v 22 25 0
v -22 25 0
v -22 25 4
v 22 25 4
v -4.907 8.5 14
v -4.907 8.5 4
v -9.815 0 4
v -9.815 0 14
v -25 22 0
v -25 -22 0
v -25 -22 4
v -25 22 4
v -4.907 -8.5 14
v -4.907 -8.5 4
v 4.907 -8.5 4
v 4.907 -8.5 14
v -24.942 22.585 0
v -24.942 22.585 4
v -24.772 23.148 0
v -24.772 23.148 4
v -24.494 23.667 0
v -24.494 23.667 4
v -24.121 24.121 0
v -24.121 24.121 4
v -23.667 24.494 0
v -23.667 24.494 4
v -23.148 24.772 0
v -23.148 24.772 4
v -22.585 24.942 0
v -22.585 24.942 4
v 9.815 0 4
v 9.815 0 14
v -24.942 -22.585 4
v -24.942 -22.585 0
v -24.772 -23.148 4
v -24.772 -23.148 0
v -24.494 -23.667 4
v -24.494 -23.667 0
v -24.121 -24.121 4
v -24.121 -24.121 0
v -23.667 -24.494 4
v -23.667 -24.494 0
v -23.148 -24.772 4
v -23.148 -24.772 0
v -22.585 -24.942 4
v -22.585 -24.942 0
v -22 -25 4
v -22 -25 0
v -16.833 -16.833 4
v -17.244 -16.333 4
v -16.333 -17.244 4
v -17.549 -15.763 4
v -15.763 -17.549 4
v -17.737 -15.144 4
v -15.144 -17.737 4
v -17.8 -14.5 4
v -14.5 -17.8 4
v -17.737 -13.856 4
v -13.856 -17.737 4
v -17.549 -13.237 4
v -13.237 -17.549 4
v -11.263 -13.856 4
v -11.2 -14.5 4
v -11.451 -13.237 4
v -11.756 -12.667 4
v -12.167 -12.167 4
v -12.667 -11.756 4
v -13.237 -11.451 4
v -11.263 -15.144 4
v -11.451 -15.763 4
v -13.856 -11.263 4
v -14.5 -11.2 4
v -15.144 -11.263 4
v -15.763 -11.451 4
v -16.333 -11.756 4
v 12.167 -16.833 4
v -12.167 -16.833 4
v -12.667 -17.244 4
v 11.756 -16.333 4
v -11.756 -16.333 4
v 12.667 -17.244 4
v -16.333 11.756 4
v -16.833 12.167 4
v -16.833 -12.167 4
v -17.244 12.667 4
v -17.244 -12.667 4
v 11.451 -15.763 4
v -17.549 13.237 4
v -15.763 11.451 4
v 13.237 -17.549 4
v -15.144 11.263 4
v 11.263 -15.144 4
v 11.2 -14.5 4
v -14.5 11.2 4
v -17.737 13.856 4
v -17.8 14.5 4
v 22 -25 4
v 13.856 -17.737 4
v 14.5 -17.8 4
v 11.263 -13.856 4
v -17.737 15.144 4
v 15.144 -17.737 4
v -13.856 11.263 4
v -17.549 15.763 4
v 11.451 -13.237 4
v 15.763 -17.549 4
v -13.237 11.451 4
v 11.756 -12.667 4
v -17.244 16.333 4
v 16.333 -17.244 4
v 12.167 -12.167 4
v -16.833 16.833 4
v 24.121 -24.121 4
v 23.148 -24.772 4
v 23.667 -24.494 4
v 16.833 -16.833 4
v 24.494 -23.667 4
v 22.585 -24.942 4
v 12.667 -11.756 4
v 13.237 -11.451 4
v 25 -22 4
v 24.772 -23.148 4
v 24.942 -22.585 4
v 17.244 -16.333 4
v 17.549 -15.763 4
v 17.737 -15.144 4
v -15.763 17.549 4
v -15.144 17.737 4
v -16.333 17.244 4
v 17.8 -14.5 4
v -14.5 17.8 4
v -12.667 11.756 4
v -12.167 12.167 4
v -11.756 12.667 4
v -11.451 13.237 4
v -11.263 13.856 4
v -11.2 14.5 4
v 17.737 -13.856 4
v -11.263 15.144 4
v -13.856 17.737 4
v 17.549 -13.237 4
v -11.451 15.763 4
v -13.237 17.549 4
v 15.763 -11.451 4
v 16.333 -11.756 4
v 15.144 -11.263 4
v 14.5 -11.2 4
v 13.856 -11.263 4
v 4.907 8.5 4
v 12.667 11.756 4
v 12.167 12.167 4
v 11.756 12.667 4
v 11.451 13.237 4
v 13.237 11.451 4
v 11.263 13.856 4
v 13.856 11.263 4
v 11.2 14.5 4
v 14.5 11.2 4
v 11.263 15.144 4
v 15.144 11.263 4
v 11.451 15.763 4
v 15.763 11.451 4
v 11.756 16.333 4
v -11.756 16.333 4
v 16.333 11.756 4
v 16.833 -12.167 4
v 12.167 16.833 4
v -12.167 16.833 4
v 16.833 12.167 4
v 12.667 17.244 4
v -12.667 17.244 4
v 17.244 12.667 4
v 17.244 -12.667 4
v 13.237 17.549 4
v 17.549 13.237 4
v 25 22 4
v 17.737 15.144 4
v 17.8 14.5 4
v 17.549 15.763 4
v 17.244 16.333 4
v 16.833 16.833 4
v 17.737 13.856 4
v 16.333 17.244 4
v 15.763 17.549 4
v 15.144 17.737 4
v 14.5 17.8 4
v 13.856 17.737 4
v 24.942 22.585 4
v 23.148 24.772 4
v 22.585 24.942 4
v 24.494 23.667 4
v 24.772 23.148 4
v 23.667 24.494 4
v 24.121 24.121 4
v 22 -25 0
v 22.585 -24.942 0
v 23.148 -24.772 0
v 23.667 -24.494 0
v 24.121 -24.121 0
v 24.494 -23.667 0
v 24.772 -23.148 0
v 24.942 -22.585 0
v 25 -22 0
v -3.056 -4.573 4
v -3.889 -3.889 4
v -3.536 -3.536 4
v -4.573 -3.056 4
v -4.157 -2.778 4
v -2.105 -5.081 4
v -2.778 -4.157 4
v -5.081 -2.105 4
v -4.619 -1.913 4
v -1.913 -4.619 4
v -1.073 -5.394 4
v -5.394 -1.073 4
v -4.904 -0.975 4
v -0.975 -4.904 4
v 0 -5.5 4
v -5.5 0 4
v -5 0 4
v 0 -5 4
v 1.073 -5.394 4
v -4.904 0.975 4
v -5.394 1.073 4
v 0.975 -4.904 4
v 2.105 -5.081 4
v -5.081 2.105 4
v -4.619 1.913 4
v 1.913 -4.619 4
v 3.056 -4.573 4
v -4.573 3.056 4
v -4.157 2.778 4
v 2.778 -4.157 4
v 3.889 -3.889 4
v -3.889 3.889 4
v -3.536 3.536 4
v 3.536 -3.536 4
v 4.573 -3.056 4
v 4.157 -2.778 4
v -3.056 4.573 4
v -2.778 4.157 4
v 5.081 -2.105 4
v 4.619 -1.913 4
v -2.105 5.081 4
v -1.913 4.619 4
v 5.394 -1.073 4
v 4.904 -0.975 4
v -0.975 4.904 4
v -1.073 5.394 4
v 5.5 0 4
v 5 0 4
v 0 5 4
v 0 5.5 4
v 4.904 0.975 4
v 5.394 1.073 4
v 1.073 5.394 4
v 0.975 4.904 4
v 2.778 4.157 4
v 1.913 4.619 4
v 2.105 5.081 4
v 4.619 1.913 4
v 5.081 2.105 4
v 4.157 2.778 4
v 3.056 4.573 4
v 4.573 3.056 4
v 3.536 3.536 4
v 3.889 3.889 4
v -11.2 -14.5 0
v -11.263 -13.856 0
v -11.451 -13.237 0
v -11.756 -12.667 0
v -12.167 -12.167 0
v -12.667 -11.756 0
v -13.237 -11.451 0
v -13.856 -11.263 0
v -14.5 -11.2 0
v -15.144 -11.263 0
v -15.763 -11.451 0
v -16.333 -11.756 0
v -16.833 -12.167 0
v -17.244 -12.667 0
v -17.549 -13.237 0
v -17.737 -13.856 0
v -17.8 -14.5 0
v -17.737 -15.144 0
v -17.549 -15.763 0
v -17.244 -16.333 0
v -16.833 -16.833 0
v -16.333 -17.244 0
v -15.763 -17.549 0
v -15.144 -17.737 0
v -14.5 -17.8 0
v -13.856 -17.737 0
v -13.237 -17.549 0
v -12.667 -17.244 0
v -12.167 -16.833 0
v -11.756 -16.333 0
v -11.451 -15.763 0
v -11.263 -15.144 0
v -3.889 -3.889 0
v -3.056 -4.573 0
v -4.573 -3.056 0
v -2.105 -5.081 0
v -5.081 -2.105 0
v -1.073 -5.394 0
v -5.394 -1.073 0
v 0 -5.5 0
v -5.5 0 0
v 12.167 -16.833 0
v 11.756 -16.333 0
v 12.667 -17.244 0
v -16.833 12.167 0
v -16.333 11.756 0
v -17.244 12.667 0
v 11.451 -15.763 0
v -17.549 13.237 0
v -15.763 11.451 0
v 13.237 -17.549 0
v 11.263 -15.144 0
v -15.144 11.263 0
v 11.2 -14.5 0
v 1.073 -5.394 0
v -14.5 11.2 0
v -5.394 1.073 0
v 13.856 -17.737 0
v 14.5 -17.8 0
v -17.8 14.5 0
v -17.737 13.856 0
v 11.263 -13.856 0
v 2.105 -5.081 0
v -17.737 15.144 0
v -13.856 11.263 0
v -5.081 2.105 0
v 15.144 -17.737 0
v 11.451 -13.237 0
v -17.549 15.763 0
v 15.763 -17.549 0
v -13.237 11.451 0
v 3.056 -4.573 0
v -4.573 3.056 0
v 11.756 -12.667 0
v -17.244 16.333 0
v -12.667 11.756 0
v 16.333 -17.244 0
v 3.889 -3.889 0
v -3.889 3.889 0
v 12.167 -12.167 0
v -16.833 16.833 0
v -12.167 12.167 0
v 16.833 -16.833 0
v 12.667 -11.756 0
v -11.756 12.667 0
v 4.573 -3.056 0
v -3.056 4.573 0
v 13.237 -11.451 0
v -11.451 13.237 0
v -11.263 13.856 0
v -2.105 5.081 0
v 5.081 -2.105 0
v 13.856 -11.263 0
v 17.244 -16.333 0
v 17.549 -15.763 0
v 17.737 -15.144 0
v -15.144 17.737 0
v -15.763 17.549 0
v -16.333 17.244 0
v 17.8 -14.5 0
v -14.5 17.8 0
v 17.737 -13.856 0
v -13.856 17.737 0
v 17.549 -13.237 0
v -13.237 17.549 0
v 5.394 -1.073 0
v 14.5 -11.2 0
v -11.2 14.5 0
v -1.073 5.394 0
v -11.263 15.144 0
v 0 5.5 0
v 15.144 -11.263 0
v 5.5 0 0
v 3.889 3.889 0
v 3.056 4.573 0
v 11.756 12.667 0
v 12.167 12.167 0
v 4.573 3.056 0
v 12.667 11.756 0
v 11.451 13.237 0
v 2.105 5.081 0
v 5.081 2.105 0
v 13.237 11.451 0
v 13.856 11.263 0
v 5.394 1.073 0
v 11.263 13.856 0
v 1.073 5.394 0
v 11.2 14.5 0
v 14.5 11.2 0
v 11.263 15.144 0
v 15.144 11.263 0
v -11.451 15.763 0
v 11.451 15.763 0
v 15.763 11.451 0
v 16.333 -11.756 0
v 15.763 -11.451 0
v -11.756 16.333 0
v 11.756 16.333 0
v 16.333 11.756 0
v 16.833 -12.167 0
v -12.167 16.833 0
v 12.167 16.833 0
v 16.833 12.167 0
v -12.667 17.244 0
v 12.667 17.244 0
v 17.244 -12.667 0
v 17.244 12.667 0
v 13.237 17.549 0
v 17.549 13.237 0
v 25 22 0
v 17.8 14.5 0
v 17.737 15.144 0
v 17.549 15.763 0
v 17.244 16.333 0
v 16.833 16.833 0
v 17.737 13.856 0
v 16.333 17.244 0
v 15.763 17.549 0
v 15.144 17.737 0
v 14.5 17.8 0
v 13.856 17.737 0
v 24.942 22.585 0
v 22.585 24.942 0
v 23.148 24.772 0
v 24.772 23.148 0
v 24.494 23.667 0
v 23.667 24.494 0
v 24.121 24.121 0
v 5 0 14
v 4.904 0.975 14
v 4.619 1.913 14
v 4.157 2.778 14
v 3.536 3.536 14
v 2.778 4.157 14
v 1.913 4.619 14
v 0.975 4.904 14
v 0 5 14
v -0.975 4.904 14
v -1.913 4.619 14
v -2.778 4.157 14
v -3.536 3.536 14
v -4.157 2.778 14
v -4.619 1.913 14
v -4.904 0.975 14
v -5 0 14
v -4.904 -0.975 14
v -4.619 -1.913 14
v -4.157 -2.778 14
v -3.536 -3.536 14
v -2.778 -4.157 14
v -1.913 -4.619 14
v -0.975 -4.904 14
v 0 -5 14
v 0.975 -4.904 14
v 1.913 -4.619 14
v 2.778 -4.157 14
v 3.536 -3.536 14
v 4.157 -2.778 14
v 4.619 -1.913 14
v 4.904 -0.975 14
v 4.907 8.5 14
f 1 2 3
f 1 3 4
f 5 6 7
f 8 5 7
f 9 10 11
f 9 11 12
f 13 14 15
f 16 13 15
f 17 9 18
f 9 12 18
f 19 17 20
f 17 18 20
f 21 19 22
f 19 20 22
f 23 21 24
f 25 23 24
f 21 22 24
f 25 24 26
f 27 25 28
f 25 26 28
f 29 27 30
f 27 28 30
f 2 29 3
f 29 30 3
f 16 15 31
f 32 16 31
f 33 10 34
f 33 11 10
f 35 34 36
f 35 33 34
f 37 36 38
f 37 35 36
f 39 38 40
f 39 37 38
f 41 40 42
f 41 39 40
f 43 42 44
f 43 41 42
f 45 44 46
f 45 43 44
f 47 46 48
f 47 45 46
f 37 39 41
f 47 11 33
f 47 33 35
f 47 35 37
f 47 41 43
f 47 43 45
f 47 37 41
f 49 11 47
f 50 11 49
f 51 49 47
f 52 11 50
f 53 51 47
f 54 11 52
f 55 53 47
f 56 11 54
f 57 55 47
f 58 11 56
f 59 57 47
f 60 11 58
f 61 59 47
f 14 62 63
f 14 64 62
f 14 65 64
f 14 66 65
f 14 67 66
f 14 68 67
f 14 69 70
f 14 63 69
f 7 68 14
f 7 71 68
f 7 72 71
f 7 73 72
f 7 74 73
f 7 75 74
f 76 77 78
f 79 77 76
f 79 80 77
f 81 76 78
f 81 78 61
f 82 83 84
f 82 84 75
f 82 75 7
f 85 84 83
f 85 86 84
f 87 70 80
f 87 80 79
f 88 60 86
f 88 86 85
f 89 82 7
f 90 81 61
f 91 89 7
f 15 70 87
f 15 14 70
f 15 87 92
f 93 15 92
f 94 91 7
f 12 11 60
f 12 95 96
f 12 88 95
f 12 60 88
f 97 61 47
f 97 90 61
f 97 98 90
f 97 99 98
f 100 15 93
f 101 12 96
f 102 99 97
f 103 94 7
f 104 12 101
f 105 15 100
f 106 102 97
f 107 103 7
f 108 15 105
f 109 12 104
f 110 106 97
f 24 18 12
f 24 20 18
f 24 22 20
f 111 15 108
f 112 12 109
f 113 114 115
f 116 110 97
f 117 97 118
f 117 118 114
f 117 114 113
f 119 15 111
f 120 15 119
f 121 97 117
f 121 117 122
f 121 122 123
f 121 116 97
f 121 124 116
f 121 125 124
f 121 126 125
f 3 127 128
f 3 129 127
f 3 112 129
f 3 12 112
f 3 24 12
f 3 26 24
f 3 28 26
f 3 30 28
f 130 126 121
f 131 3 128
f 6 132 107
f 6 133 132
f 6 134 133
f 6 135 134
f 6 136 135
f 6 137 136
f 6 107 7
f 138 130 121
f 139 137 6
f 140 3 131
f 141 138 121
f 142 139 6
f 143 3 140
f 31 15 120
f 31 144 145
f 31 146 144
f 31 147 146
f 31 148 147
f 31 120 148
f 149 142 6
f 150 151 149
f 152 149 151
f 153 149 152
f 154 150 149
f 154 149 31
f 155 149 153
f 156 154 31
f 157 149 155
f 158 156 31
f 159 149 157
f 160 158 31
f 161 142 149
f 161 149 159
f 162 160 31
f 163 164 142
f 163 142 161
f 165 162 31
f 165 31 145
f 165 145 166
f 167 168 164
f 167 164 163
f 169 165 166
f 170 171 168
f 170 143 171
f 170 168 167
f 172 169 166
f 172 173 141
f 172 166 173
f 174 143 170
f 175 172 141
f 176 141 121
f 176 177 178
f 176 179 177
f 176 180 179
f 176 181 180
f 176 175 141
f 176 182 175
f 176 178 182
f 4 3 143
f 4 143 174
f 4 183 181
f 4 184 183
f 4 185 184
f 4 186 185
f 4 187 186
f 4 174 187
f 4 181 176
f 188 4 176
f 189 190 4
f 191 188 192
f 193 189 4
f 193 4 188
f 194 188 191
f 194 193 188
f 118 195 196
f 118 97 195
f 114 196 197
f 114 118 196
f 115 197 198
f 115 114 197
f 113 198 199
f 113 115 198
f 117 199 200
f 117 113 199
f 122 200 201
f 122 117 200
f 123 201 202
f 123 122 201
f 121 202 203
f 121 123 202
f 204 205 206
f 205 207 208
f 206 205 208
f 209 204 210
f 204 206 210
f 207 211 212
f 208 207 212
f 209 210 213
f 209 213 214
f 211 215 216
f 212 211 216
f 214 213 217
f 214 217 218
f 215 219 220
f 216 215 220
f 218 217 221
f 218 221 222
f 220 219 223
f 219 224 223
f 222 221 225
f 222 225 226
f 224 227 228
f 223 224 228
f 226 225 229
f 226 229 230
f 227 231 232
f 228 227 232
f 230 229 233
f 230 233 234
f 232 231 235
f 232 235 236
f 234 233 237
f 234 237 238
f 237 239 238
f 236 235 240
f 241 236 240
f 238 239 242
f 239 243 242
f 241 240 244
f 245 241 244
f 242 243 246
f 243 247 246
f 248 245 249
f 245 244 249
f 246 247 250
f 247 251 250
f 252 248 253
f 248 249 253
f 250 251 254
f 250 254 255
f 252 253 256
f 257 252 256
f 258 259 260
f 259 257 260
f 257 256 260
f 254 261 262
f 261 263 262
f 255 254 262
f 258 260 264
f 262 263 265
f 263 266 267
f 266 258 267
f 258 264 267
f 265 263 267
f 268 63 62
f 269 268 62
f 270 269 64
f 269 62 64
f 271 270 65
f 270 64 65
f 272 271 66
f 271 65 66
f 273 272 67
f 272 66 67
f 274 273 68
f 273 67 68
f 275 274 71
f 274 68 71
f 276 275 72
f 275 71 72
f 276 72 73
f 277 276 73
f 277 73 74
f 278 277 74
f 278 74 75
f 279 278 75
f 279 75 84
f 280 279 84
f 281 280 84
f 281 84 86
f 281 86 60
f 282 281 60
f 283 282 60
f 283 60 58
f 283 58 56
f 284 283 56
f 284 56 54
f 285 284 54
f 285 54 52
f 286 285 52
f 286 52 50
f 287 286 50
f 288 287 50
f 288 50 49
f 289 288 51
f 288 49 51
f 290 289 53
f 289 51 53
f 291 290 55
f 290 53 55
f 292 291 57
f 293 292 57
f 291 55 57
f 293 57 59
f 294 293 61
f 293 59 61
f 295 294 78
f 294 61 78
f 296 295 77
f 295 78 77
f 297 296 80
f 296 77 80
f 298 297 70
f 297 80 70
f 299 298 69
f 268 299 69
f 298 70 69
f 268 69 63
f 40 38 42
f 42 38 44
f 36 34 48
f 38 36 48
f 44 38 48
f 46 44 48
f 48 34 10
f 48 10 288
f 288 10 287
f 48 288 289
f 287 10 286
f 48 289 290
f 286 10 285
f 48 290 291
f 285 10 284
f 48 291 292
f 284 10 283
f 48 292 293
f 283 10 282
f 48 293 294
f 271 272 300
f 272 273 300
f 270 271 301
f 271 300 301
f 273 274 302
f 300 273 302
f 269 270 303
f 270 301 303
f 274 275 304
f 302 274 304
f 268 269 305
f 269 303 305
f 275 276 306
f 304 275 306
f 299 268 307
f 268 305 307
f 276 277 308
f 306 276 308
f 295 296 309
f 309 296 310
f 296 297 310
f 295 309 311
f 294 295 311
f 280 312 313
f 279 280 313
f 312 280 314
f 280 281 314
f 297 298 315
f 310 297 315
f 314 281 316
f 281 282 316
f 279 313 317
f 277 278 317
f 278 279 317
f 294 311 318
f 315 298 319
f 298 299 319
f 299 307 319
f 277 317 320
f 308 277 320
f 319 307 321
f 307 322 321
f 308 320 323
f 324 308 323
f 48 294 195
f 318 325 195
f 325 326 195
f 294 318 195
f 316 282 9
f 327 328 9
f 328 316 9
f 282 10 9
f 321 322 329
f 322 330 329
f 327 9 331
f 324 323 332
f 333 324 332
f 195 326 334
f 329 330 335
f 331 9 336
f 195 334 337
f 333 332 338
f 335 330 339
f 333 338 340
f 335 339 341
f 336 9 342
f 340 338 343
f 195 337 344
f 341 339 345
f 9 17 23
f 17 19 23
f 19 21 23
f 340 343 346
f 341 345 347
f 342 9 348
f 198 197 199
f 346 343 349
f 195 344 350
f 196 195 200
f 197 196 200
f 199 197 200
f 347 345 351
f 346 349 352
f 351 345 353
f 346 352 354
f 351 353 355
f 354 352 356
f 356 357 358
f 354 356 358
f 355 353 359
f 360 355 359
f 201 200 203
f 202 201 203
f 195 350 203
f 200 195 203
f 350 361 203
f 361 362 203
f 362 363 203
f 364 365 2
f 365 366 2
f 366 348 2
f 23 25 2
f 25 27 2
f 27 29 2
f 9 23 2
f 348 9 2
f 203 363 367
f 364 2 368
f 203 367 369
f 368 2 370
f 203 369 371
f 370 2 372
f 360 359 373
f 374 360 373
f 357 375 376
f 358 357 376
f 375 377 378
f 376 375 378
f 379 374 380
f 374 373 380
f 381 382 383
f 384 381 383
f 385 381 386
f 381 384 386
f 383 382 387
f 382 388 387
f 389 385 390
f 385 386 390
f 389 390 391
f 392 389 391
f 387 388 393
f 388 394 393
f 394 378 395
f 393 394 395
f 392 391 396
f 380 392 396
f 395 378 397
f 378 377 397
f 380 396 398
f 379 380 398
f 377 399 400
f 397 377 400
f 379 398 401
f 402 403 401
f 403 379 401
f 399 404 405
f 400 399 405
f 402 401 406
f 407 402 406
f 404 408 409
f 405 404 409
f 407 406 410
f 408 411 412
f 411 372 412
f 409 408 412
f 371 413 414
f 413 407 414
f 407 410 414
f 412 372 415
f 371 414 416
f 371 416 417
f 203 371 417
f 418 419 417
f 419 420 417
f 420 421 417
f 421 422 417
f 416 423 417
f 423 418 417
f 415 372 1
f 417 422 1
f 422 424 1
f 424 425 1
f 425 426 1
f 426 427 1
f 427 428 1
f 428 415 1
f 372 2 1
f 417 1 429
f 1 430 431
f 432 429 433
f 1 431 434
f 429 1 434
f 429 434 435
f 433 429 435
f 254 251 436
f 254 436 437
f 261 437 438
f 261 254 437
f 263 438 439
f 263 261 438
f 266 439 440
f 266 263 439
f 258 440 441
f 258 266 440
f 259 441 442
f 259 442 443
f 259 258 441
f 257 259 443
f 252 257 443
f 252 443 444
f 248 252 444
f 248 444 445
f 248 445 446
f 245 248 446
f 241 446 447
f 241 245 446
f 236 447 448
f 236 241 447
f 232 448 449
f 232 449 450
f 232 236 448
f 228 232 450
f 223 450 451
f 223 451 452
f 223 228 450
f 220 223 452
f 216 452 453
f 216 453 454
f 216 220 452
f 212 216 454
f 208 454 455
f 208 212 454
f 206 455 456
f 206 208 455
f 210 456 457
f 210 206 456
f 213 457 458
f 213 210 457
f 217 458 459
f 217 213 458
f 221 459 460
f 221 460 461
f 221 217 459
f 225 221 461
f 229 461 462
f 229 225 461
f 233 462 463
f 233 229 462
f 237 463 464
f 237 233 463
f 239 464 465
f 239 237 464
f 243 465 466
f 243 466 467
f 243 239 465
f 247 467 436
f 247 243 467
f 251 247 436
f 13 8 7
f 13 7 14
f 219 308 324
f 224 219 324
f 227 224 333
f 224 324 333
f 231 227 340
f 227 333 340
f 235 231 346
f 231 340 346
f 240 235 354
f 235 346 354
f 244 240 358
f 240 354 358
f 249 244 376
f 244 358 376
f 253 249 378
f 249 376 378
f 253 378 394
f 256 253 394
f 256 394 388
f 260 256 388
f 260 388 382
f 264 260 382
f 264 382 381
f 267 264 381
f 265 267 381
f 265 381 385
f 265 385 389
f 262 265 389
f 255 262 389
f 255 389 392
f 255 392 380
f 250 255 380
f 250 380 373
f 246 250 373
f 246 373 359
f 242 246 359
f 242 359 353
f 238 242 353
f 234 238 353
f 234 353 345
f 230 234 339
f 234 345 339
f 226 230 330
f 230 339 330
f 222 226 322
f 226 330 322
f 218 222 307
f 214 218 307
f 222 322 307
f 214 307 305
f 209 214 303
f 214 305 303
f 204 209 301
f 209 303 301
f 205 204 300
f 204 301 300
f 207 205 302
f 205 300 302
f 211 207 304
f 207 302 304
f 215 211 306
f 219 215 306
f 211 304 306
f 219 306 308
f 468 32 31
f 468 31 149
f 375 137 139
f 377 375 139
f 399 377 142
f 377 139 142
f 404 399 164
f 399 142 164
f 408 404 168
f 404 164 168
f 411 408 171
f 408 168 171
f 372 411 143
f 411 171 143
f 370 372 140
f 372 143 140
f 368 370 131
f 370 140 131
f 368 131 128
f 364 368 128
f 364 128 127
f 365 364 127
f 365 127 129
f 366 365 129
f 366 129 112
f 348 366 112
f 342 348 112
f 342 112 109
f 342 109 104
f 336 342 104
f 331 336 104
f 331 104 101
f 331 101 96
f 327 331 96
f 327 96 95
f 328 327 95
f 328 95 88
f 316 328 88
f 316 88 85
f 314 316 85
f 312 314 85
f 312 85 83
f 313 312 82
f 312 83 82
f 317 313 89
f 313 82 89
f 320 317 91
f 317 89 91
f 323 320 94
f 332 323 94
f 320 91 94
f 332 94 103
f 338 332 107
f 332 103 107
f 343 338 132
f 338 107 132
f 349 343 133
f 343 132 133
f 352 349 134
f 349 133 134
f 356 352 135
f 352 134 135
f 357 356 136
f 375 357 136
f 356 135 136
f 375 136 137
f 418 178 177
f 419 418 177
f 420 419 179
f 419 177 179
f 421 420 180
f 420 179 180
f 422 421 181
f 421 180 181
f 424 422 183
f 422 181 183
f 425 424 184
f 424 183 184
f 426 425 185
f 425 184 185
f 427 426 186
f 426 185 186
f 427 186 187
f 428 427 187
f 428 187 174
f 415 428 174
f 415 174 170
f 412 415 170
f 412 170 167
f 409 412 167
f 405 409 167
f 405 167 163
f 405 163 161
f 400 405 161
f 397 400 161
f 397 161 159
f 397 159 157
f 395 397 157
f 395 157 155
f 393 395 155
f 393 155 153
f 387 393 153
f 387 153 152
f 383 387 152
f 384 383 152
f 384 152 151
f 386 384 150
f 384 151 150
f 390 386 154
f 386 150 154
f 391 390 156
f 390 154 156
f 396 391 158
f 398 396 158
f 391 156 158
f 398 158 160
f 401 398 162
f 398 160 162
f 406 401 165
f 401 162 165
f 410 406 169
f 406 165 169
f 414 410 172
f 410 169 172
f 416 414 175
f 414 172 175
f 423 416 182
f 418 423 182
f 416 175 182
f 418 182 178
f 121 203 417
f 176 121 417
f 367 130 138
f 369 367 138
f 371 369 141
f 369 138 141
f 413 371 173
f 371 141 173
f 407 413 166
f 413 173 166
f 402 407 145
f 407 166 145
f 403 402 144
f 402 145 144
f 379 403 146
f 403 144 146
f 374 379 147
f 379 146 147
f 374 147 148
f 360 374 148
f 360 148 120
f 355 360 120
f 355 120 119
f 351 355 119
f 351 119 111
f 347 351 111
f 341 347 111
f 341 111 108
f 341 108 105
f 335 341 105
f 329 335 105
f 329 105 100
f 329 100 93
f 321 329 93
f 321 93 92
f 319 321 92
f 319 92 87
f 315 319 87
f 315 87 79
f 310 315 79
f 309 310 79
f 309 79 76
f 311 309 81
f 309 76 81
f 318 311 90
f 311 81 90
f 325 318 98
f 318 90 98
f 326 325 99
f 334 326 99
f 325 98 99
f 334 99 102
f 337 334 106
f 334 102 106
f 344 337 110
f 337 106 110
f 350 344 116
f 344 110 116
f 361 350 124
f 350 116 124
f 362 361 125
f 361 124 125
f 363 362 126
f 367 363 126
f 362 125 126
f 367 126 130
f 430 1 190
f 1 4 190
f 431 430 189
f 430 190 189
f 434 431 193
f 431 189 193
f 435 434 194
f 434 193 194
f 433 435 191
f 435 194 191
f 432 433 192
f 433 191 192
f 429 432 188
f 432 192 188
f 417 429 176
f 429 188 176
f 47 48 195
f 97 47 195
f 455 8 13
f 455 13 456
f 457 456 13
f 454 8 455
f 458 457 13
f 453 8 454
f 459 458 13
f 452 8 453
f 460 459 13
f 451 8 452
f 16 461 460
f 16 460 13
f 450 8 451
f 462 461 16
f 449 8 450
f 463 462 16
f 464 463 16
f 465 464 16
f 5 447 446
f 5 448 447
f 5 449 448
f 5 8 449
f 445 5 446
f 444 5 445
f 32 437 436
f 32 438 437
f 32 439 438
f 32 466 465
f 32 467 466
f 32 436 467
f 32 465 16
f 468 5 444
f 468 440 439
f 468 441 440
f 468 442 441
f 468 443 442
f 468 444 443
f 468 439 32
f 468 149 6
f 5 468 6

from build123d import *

# Parameters (mm, degrees)
SKETCH_1_W         = 50
SKETCH_1_H         = 50
EXTRUDE_1_DEPTH    = 4
HOLE_WIZARD_M101_D = 11
FILLET_1_R         = 3
HOLE_WIZARD_M61_D  = 6.6
SKETCH_6_R         = 5
EXTRUDE_2_DEPTH    = 10


with BuildPart() as part:
    # Эскиз1 → Бобышка-Вытянуть1 (new body)
    with BuildSketch(Plane.XY):
        Rectangle(SKETCH_1_W, SKETCH_1_H)
    extrude(amount=EXTRUDE_1_DEPTH)

    # Отверстие с зазором M101 (through all)
    with Locations(Plane.XY.offset(4)):
        with Locations((0, 0)):
            Hole(HOLE_WIZARD_M101_D / 2)

    # Скругление1
    fillet_1_edges = [part.edges().sort_by_distance(p)[0] for p in [
        (25, -25, 2),
        (-25, -25, 2),
        (-25, 25, 2),
        (25, 25, 2),
    ]]
    fillet(fillet_1_edges, radius=FILLET_1_R)

    # Отверстие с зазором M61 (through all)
    with Locations(Plane(origin=(0, 0, 0), x_dir=(-1, 0, 0), z_dir=(0, 0, -1))):
        with Locations((-14.5, 14.5), (0, 0), (14.5, 14.5), (-14.5, -14.5), (14.5, -14.5)):
            Hole(HOLE_WIZARD_M61_D / 2)

    # Эскиз6 → Бобышка-Вытянуть2 (add)
    with BuildSketch(Plane.XY.offset(4)):
        Polygon((4.907477288, -8.5), (9.814954576, 0), (4.907477288, 8.5), (-4.907477288, 8.5), (-9.814954576, 0), (-4.907477288, -8.5), align=None)
        Circle(SKETCH_6_R, mode=Mode.SUBTRACT)
    extrude(amount=EXTRUDE_2_DEPTH)


solid = part.part
